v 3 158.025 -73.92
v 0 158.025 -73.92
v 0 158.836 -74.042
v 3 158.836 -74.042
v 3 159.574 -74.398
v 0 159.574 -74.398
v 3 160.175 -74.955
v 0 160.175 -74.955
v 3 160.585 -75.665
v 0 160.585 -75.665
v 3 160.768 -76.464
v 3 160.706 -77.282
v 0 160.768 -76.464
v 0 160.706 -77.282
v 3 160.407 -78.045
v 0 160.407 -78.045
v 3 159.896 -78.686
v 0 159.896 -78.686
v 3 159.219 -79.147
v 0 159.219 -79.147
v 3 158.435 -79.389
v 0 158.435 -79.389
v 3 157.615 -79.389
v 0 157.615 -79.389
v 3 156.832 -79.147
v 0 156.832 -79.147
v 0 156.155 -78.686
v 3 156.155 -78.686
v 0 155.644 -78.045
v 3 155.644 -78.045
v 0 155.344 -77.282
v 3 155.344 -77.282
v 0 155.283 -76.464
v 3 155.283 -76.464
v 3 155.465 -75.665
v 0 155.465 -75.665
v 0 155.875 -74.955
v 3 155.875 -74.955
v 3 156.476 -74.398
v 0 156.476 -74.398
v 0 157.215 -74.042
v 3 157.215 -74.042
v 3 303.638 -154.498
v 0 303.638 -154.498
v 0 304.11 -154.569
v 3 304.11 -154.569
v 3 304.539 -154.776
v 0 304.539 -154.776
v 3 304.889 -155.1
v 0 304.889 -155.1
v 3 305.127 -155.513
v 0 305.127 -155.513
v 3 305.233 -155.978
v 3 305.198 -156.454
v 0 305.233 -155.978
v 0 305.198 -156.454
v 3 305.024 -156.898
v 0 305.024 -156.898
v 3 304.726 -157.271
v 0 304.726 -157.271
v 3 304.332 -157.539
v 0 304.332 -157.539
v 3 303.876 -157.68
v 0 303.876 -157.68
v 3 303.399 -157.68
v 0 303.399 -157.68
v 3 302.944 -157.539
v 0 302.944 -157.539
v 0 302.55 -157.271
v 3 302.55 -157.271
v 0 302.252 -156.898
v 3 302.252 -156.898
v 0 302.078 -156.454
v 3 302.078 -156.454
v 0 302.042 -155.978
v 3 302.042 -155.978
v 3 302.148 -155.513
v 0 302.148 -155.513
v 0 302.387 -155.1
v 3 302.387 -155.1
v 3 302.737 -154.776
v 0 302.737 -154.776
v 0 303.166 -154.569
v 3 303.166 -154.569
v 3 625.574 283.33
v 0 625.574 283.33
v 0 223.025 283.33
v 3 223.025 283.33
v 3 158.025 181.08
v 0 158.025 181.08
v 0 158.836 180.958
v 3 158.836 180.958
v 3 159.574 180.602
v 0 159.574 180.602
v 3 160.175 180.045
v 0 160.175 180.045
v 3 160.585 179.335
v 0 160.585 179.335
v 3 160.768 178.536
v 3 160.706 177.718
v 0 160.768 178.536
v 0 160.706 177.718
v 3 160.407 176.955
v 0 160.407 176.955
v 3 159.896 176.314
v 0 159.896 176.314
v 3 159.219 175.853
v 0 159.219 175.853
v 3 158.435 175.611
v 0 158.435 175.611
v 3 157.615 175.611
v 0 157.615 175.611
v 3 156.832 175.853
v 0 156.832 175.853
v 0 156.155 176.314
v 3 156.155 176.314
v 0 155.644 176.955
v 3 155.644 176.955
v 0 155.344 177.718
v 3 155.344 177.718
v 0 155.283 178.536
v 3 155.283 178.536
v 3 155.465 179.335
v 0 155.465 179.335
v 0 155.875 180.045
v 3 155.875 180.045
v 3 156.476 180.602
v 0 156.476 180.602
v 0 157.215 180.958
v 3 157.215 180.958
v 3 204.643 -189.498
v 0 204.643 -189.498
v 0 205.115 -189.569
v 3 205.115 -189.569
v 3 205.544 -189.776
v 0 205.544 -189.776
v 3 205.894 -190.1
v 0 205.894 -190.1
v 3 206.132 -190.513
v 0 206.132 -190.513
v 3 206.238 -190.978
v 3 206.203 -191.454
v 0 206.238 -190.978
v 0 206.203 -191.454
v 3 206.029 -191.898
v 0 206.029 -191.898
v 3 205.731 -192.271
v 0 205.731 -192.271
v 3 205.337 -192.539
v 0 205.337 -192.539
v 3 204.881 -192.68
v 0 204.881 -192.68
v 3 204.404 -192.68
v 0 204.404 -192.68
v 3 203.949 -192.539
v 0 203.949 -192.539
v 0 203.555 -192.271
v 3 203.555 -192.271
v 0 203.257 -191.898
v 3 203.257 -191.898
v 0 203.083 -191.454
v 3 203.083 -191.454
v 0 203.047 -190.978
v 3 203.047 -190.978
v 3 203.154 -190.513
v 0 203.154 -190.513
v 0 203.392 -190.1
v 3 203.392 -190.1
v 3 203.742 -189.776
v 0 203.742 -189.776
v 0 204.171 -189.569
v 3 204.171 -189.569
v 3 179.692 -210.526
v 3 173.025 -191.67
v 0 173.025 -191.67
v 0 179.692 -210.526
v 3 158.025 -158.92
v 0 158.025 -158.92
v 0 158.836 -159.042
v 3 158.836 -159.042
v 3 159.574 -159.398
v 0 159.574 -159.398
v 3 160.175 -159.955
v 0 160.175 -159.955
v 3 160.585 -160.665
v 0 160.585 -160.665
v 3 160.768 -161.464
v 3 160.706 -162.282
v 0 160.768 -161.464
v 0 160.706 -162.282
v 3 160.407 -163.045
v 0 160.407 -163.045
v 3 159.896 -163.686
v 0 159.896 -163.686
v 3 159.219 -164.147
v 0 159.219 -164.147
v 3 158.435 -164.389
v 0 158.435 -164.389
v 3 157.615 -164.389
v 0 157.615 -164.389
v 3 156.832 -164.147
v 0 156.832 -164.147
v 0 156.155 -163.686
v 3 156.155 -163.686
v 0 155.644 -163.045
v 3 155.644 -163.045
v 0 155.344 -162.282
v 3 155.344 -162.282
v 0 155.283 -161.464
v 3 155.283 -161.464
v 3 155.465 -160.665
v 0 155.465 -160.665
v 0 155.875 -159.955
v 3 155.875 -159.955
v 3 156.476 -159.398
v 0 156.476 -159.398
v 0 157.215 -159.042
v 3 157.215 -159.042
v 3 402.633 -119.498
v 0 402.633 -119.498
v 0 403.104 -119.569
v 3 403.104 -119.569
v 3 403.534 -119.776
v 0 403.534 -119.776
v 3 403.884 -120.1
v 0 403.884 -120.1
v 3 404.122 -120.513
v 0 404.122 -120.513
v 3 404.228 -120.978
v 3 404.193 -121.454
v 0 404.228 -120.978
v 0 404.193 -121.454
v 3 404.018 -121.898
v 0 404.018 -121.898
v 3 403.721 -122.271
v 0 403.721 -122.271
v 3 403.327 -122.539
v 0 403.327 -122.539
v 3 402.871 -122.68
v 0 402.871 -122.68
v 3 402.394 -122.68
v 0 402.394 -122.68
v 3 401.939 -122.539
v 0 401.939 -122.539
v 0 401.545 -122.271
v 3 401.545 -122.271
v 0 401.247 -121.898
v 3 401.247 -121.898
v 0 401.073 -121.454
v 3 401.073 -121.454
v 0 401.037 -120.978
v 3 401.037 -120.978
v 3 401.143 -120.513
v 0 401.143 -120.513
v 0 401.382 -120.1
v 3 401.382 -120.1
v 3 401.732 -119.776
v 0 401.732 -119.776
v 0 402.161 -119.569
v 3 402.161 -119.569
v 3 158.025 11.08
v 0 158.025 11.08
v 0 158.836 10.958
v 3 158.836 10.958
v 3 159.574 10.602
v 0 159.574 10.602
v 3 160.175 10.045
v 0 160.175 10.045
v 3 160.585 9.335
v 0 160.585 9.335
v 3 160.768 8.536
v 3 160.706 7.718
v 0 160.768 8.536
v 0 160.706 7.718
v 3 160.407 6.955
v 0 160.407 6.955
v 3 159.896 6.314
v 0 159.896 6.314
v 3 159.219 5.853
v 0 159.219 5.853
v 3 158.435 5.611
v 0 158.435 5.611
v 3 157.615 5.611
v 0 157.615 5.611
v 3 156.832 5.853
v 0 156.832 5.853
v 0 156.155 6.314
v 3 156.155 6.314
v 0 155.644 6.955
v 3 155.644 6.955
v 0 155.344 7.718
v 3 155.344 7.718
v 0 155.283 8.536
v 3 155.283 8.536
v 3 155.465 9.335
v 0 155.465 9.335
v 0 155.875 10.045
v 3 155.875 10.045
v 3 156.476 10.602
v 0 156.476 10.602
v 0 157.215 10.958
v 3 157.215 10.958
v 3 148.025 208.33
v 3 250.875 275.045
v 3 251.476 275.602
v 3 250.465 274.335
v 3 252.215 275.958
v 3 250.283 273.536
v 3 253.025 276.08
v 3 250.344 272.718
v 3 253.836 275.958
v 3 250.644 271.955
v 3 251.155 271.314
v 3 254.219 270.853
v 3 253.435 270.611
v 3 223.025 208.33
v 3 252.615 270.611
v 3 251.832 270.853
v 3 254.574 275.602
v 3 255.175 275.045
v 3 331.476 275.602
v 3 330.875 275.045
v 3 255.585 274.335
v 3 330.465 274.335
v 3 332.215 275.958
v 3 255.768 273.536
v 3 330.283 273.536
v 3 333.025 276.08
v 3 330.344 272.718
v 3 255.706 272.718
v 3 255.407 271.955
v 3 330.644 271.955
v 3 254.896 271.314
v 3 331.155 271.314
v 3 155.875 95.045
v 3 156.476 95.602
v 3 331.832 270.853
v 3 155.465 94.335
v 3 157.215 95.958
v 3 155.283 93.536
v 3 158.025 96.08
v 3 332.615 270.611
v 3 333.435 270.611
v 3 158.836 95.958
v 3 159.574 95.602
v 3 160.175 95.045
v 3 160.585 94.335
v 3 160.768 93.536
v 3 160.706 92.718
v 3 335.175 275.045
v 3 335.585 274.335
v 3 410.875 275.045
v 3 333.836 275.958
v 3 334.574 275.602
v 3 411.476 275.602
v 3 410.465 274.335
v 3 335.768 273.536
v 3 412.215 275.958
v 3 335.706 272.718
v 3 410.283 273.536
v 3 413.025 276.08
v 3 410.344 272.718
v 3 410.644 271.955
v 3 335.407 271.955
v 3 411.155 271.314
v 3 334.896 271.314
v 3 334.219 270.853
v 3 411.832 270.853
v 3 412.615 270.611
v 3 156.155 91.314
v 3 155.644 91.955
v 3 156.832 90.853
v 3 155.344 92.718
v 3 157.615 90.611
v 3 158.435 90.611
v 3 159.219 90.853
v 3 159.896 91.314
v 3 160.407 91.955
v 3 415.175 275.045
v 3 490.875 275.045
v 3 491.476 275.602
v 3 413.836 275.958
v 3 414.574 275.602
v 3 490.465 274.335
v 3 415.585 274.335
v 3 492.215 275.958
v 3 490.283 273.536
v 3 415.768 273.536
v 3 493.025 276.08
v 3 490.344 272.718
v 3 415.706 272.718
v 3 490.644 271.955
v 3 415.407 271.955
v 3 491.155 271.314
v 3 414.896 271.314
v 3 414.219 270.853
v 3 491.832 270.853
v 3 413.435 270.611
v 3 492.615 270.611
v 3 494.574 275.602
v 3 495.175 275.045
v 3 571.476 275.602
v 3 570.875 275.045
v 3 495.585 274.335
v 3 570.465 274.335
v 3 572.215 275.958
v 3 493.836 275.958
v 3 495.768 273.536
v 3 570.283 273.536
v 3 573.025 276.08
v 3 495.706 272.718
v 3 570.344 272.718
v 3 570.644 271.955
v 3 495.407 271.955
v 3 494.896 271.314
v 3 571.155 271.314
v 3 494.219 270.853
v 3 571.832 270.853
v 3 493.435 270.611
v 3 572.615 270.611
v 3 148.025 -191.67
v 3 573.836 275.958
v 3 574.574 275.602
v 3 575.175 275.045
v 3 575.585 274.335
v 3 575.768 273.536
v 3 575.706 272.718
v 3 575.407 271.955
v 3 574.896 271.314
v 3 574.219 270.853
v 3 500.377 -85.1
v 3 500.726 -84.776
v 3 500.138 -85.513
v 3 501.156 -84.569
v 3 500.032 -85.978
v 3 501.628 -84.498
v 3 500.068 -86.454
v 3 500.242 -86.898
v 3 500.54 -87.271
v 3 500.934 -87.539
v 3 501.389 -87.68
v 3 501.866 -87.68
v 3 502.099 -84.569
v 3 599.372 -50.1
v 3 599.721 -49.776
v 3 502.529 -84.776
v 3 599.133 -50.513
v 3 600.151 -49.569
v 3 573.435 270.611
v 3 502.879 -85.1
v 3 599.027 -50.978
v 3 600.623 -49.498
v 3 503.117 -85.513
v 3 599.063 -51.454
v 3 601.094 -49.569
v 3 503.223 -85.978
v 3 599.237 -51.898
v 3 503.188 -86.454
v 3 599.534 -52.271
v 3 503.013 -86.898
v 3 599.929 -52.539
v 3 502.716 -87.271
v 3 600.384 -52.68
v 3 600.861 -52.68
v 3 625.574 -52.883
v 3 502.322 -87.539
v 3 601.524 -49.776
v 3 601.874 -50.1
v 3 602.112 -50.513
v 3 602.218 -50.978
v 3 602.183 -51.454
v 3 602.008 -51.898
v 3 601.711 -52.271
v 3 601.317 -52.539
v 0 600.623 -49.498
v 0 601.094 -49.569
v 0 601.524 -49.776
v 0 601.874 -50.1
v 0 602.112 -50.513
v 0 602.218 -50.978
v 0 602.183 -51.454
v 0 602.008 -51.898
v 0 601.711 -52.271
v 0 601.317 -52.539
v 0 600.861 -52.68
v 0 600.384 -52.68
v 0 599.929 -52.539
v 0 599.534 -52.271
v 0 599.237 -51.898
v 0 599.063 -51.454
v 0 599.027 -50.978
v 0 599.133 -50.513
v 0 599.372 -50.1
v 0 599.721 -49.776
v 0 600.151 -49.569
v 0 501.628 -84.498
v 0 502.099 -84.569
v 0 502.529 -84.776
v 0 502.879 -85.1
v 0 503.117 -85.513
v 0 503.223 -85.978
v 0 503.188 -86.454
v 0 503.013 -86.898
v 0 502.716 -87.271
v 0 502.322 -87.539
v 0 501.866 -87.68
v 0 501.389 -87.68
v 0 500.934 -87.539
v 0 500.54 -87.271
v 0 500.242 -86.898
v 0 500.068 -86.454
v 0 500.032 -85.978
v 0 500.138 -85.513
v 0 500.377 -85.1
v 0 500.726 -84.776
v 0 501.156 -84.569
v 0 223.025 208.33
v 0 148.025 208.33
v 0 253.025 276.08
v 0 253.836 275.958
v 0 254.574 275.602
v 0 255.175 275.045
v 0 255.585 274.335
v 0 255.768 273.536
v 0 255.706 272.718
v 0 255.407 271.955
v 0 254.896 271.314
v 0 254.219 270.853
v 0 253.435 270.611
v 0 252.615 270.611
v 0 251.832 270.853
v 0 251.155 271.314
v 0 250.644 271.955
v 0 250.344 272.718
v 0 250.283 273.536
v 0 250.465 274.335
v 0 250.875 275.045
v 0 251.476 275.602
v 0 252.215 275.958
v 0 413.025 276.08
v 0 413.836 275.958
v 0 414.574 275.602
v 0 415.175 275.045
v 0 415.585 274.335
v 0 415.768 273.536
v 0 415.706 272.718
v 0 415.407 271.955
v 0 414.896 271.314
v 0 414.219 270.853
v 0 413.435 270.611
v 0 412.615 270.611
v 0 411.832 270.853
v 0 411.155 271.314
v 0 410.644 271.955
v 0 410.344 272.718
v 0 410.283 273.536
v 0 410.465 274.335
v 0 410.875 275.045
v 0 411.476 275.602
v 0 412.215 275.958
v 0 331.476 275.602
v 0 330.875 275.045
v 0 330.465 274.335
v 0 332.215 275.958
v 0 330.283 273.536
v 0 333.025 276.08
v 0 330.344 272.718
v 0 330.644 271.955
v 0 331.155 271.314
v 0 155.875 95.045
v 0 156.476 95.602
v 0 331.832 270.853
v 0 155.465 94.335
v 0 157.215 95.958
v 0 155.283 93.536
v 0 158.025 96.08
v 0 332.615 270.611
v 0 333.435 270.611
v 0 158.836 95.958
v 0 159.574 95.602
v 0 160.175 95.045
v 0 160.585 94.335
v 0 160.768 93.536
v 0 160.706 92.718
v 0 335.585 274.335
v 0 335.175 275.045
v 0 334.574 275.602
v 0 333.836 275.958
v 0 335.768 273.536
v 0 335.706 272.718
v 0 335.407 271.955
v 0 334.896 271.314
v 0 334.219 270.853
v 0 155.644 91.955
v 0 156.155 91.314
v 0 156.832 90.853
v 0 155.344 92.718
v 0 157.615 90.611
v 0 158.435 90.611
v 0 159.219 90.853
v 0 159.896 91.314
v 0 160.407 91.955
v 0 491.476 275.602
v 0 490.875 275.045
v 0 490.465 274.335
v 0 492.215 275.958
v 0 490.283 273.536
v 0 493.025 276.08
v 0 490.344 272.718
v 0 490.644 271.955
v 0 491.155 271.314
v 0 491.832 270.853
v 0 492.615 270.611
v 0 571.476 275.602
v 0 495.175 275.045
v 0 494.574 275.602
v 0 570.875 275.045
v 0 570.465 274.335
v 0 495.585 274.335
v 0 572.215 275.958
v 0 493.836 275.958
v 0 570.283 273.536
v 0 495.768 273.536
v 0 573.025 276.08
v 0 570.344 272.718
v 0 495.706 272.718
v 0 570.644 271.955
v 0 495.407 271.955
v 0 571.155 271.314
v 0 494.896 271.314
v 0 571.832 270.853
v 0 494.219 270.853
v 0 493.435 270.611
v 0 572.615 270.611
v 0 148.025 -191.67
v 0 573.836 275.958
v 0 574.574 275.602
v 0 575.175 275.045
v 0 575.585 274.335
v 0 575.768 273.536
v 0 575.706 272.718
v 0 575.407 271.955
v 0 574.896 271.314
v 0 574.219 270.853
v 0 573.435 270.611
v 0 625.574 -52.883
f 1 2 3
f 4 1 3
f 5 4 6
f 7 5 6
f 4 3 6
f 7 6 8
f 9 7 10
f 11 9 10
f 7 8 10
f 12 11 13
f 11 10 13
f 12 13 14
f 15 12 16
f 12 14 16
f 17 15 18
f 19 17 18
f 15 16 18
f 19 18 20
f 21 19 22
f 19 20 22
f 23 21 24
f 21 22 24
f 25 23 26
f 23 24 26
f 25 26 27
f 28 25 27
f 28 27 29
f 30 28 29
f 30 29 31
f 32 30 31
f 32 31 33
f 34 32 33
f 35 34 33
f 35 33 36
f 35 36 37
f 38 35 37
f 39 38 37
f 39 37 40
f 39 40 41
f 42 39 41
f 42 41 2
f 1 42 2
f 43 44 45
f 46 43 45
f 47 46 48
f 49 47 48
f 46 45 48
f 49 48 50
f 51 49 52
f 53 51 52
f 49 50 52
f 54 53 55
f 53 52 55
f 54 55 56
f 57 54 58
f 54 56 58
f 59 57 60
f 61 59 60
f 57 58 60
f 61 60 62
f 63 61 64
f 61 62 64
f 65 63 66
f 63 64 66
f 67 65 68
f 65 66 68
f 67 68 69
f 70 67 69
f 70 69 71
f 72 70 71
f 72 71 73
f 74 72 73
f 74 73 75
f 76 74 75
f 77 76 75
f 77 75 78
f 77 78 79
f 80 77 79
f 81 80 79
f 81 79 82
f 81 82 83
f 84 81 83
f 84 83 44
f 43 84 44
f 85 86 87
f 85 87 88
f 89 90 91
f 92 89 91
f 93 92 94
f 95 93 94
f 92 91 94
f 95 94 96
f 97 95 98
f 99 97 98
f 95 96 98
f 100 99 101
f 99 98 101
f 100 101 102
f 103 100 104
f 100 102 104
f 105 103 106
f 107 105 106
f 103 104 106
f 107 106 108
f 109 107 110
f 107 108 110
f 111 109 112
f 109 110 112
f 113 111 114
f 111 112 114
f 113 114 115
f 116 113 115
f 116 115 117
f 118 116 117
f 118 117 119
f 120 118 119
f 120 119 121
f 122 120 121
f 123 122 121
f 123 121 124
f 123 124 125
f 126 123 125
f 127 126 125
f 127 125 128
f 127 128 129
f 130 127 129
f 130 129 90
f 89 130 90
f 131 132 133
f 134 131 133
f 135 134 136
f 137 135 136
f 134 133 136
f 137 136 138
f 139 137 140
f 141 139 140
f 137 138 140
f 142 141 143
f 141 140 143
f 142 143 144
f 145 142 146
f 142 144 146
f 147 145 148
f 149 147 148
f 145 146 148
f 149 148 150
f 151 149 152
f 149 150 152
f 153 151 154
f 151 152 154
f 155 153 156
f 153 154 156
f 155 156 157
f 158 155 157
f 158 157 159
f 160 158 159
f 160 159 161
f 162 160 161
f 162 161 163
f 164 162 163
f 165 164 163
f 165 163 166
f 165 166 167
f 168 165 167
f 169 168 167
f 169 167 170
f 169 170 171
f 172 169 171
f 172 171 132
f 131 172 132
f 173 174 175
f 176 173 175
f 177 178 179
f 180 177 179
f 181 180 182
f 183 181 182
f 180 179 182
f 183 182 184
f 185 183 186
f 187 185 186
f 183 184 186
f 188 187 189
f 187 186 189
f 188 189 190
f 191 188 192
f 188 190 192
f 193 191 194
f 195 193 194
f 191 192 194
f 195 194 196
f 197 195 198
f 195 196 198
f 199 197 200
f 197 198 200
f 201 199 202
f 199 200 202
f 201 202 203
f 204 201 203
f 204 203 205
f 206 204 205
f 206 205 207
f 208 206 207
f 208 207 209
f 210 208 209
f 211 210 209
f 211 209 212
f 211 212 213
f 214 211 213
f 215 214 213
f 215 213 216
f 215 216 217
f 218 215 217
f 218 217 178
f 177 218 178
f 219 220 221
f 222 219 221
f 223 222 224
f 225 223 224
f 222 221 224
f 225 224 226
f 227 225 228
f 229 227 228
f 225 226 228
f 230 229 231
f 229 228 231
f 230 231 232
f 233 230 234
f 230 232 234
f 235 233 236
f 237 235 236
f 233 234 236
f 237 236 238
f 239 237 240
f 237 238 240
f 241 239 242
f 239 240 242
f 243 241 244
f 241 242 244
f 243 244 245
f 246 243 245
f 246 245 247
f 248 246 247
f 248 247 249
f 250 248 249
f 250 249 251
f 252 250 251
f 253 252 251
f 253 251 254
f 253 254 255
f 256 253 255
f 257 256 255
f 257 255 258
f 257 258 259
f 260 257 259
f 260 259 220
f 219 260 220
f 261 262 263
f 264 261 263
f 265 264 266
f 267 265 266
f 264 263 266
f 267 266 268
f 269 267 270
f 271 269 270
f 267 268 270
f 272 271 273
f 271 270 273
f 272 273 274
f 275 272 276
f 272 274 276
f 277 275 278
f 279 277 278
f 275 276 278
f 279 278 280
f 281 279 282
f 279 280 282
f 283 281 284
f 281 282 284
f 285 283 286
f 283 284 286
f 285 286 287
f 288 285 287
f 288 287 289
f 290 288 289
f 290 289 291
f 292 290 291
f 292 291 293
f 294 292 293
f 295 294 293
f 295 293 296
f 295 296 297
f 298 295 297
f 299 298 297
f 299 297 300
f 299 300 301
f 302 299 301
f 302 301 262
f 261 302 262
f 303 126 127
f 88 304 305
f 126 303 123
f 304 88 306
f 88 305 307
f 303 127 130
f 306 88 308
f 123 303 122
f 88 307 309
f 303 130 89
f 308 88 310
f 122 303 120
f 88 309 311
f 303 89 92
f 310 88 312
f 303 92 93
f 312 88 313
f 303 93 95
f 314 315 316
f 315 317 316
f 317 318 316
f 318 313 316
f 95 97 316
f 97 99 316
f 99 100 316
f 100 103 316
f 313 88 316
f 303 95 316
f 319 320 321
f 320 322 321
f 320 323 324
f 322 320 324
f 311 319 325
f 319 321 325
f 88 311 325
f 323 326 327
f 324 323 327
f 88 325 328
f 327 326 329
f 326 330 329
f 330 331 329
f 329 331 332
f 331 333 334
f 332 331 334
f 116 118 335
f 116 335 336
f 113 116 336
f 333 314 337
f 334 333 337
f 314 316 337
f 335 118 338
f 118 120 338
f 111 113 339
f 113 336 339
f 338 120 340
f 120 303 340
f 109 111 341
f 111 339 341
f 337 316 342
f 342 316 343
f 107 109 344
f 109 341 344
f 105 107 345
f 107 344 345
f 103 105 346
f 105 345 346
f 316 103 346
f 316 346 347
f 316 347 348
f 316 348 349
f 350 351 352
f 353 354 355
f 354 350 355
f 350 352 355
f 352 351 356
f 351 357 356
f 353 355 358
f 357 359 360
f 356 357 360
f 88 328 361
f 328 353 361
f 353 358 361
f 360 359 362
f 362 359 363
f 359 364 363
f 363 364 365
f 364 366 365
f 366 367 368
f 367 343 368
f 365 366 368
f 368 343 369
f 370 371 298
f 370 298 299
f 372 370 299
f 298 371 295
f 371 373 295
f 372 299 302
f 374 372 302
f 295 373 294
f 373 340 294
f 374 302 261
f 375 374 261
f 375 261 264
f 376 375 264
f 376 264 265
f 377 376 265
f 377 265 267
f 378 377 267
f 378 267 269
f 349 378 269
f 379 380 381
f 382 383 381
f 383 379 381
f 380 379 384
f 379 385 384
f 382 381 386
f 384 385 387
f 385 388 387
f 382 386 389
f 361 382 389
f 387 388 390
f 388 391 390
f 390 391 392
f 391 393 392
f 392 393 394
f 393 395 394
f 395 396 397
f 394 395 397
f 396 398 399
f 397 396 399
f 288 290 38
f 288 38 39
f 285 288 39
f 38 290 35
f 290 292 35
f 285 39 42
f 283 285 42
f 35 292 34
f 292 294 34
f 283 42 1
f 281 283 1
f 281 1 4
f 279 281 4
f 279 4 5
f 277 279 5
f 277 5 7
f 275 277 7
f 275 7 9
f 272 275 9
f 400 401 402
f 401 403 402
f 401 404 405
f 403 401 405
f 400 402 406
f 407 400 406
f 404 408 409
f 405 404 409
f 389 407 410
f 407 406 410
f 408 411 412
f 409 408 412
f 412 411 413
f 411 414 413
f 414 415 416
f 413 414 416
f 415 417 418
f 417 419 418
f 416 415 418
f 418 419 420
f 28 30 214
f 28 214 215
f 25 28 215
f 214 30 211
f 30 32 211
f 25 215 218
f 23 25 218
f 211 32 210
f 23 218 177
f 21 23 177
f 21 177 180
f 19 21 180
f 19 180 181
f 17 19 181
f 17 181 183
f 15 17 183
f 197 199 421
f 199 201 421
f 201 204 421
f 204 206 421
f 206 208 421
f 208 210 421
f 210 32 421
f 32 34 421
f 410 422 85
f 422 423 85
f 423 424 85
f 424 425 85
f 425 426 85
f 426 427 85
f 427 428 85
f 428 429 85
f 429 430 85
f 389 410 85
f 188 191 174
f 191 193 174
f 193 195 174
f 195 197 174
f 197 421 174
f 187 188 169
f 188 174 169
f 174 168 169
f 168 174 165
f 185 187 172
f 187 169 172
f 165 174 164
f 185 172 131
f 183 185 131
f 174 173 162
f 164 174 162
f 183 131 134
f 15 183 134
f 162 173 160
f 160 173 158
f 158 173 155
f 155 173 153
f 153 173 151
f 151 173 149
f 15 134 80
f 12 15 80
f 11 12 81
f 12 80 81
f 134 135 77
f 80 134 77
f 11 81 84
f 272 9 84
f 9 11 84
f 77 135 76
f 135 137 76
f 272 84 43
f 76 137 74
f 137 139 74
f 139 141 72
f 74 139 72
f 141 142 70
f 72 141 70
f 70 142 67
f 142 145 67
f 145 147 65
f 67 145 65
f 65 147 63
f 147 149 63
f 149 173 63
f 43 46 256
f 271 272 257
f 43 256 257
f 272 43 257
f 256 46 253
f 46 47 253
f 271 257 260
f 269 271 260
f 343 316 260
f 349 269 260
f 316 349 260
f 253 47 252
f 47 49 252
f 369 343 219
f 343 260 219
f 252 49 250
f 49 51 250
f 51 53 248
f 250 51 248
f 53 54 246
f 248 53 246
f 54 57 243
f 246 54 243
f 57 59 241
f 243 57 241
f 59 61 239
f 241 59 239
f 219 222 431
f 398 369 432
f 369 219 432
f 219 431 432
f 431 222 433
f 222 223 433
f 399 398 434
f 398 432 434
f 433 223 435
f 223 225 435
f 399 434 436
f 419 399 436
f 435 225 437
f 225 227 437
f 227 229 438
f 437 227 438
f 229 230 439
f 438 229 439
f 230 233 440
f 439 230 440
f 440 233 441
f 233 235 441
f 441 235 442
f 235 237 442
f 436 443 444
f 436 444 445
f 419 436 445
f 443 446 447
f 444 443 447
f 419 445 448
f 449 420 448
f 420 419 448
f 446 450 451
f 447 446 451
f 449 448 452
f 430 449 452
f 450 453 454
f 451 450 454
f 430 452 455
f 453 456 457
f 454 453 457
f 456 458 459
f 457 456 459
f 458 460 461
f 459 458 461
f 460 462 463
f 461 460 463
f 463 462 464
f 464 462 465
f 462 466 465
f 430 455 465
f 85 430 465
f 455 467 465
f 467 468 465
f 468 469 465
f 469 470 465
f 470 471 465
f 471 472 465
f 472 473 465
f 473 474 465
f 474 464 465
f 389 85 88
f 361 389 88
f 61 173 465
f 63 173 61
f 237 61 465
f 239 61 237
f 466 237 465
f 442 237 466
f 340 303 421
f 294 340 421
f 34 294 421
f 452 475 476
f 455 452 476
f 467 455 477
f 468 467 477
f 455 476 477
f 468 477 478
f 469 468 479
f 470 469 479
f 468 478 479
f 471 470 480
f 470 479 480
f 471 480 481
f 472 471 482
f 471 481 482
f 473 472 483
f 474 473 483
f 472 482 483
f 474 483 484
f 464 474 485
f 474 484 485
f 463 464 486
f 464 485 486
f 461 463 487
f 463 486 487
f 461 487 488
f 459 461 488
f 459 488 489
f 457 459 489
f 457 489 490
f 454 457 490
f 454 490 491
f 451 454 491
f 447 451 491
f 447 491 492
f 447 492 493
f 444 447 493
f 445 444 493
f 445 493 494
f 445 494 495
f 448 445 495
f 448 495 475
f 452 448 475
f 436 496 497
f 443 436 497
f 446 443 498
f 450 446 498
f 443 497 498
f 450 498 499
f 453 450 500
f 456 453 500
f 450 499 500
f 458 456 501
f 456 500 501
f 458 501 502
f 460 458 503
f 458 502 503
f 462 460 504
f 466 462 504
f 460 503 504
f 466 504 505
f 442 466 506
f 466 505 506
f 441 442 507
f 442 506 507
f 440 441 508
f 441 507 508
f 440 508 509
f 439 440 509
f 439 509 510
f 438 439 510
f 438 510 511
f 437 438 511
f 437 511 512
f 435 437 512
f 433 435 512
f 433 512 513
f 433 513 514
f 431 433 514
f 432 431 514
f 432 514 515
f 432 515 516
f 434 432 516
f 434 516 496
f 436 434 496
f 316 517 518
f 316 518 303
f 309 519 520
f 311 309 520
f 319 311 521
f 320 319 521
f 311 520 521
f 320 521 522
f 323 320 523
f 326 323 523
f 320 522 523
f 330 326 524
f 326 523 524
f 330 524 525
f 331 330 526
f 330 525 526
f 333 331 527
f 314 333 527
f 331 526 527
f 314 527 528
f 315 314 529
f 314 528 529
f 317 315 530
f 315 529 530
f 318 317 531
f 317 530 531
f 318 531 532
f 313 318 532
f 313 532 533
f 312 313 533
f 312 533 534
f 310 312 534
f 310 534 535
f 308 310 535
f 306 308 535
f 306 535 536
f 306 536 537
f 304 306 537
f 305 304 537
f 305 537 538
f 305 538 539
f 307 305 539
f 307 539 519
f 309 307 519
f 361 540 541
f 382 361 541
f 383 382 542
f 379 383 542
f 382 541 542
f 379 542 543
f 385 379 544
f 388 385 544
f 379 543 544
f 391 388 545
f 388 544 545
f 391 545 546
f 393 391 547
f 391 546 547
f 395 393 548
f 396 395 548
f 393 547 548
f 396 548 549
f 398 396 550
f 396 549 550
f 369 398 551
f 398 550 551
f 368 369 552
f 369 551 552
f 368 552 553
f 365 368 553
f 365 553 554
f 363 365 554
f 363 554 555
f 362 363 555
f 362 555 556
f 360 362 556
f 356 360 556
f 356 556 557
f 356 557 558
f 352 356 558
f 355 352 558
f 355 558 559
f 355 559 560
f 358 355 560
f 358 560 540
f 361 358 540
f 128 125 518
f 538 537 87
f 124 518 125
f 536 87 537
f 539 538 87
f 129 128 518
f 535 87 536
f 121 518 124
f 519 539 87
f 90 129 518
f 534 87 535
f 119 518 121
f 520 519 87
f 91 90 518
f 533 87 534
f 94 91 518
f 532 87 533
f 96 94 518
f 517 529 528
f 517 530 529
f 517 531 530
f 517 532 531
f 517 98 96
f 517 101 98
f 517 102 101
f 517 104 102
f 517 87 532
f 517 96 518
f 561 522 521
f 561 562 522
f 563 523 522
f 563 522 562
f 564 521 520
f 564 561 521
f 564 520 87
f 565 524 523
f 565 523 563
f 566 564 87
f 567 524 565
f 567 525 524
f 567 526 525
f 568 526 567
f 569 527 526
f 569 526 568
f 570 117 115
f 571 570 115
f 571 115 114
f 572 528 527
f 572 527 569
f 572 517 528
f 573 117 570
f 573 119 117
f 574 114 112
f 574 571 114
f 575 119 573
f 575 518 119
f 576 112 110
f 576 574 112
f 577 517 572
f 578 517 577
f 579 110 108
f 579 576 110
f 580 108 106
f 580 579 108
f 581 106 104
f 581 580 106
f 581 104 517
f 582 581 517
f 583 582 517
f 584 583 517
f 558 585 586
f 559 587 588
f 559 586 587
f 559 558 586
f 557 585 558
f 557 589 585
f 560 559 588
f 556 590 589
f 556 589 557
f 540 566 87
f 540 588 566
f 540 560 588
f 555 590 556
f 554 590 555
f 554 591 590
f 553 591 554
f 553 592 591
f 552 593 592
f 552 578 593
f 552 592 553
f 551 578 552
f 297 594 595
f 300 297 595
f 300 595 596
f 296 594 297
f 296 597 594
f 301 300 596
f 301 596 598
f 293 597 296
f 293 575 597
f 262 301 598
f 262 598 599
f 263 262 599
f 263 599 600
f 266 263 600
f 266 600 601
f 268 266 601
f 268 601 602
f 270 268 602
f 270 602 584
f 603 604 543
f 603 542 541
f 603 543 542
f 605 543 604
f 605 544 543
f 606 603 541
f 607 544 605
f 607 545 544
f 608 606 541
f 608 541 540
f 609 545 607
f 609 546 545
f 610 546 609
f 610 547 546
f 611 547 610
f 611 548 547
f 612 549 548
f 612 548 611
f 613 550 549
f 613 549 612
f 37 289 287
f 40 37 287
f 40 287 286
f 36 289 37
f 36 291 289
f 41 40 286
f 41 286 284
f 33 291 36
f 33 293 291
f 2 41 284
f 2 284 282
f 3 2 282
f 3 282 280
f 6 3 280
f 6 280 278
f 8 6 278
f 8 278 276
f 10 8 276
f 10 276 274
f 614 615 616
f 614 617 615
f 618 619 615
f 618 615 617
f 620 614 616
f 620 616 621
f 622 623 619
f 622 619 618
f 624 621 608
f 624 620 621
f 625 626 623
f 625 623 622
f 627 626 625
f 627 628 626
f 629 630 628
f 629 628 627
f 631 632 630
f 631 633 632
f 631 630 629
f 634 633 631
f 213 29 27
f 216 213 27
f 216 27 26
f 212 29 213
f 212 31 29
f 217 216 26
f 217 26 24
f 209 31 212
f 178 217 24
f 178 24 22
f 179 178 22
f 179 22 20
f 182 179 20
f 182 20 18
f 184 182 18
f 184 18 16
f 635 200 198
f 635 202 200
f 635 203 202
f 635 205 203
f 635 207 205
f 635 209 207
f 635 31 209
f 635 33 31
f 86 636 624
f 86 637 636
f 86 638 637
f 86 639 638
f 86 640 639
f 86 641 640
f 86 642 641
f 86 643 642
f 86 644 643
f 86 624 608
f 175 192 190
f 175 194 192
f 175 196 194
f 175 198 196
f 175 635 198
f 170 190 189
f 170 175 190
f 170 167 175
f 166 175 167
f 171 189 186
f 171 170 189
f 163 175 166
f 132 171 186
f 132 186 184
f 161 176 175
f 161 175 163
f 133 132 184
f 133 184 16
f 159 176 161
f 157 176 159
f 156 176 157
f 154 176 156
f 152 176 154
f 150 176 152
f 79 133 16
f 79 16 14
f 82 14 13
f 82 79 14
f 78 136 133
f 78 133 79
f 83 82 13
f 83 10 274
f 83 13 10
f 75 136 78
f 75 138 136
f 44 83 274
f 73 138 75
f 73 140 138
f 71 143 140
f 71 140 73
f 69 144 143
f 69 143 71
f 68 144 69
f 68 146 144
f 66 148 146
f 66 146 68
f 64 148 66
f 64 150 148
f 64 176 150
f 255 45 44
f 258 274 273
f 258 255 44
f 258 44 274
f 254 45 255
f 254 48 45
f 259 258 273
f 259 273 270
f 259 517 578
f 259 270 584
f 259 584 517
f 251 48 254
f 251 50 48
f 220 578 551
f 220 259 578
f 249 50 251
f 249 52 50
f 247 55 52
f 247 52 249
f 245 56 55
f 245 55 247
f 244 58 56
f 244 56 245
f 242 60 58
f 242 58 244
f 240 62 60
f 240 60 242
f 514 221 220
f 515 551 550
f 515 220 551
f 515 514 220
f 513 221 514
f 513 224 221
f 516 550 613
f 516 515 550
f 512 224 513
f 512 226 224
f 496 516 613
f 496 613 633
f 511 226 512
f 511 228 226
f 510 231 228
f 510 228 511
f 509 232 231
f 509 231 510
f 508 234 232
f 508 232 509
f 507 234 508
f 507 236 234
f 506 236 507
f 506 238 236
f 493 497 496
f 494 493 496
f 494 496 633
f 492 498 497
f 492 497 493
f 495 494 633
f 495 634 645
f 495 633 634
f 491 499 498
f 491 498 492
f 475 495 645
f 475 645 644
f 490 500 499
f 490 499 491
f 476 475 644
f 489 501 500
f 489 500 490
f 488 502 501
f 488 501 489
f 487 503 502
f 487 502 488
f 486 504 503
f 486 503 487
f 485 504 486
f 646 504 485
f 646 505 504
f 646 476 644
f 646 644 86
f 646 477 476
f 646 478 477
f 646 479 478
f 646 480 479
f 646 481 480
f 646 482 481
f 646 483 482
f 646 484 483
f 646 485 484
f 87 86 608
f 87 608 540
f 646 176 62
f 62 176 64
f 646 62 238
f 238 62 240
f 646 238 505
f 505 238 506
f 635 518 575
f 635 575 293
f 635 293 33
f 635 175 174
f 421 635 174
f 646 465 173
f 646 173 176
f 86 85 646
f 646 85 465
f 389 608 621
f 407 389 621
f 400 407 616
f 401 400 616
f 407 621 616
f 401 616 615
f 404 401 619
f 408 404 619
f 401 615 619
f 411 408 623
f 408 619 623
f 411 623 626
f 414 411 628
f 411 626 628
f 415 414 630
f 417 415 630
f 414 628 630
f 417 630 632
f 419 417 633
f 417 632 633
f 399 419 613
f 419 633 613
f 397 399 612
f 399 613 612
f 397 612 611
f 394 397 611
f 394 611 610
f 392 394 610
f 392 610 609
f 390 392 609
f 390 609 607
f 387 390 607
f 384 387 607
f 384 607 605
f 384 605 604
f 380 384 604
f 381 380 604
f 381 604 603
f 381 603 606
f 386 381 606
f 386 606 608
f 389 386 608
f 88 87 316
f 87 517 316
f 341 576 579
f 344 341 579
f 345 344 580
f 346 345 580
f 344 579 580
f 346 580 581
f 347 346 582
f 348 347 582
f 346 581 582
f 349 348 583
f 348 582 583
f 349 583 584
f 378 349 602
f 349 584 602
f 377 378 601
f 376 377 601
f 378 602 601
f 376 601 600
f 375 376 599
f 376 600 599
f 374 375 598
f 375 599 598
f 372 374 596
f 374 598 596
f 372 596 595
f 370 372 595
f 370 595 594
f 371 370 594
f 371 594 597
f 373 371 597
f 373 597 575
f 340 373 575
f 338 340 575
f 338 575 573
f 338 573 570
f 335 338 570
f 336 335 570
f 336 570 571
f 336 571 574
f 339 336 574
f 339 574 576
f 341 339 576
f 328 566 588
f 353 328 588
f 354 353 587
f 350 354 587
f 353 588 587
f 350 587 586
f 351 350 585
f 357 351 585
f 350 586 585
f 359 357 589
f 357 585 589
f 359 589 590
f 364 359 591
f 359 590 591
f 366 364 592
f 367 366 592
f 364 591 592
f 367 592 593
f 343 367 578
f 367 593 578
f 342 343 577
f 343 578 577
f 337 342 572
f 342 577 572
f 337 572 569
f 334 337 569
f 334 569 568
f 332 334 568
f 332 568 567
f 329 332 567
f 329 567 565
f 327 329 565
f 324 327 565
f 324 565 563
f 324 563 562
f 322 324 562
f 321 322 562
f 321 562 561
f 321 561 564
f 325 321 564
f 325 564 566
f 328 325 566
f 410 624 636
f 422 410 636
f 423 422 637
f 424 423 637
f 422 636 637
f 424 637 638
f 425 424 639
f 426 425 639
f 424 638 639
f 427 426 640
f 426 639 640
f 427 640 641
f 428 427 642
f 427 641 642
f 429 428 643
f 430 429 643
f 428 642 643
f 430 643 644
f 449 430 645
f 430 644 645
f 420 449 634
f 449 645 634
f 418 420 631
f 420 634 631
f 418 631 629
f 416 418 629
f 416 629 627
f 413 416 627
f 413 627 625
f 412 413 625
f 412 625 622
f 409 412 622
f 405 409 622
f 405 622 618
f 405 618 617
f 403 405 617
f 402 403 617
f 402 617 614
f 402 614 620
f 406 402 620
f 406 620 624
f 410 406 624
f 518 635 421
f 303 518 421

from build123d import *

# Parameters (mm, degrees)
BOSS_EXTRUDE1_DEPTH        = 3
SKETCH2_W                  = 50
SKETCH2_H                  = 50
CUT_EXTRUDE1_DEPTH         = 10
SKETCH3_W                  = 3
SKETCH3_H                  = 480
BOSS_EXTRUDE2_DEPTH        = 20
SKETCH5_W                  = 3
SKETCH5_H                  = 400
BOSS_EXTRUDE3_DEPTH        = 25
SKETCH6_W                  = 3
SKETCH6_H                  = 402.54833996
BOSS_EXTRUDE4_DEPTH        = 25
SKETCH7_W                  = 25.200898878
SKETCH7_H                  = 14.317309472
CUT_EXTRUDE2_DEPTH         = 25
F_3_2_3_2_DIAMETER_HOLE1_D = 3.2
F_5_5_5_5_DIAMETER_HOLE1_D = 5.5


with BuildPart() as part:
    # Sketch1 → Boss-Extrude1 (new body)
    with BuildSketch(Plane(origin=(0, 0, 0), x_dir=(0, 0, -1), z_dir=(1, 0, 0))):
        Polygon((31.669668796, 625.573683549), (191.669668796, 173.025343589), (-258.330331204, 173.025343589), (-258.330331204, 625.573683549), align=None)
    extrude(amount=BOSS_EXTRUDE1_DEPTH)

    # Sketch2 → Cut-Extrude1 (cut)
    with BuildSketch(Plane.ZY):
        with Locations((233.330331204, 198.025343589)):
            Rectangle(SKETCH2_W, SKETCH2_H)
    extrude(amount=-CUT_EXTRUDE1_DEPTH, mode=Mode.SUBTRACT)

    # Sketch3 → Boss-Extrude2 (add)
    with BuildSketch(Plane(origin=(0, 79.461003756, -224.749658383), x_dir=(-1, 0, 0), z_dir=(0, 0.3333333333333335, -0.9428090415820635))):
        with Locations((-1.5, 339.23996876)):
            Rectangle(SKETCH3_W, SKETCH3_H)
    extrude(amount=BOSS_EXTRUDE2_DEPTH)

    # Sketch5 → Boss-Extrude3 (add)
    with BuildSketch(Plane.XZ.offset(-173.025343589)):
        with Locations((1.5, 8.330331204)):
            Rectangle(SKETCH5_W, SKETCH5_H)
    extrude(amount=BOSS_EXTRUDE3_DEPTH)

    # Sketch6 → Boss-Extrude4 (add)
    with BuildSketch(Plane.XY.offset(258.330331204)):
        with Locations((1.5, 424.299513569)):
            Rectangle(SKETCH6_W, SKETCH6_H)
    extrude(amount=BOSS_EXTRUDE4_DEPTH)

    # Sketch7 → Cut-Extrude2 (cut)
    with BuildSketch(Plane(origin=(3, 0, 0), x_dir=(0, 0, -1), z_dir=(1, 0, 0))):
        with Locations((44.270118235, 632.732338285)):
            Rectangle(SKETCH7_W, SKETCH7_H)
    extrude(amount=-CUT_EXTRUDE2_DEPTH, mode=Mode.SUBTRACT)

    # Ø3.2 (3.2) Diameter Hole1 (through all)
    with Locations(Plane(origin=(3, 0, 0), x_dir=(0, 0, -1), z_dir=(1, 0, 0))):
        with Locations((191.097759212, 204.64294817), (156.097759212, 303.637897536), (121.097759212, 402.632846902), (86.097759212, 501.627796268), (51.097759212, 600.622745635)):
            Hole(F_3_2_3_2_DIAMETER_HOLE1_D / 2)

    # Ø5.5 (5.5) Diameter Hole1 (through all)
    with Locations(Plane(origin=(3, 0, 0), x_dir=(0, 0, -1), z_dir=(1, 0, 0))):
        with Locations((161.669668796, 158.025343589), (76.669668796, 158.025343589), (-8.330331204, 158.025343589), (-93.330331204, 158.025343589), (-178.330331204, 158.025343589), (-273.330331204, 253.025343589), (-273.330331204, 333.025343589), (-273.330331204, 413.025343589), (-273.330331204, 493.025343589), (-273.330331204, 573.025343589)):
            Hole(F_5_5_5_5_DIAMETER_HOLE1_D / 2)


solid = part.part
